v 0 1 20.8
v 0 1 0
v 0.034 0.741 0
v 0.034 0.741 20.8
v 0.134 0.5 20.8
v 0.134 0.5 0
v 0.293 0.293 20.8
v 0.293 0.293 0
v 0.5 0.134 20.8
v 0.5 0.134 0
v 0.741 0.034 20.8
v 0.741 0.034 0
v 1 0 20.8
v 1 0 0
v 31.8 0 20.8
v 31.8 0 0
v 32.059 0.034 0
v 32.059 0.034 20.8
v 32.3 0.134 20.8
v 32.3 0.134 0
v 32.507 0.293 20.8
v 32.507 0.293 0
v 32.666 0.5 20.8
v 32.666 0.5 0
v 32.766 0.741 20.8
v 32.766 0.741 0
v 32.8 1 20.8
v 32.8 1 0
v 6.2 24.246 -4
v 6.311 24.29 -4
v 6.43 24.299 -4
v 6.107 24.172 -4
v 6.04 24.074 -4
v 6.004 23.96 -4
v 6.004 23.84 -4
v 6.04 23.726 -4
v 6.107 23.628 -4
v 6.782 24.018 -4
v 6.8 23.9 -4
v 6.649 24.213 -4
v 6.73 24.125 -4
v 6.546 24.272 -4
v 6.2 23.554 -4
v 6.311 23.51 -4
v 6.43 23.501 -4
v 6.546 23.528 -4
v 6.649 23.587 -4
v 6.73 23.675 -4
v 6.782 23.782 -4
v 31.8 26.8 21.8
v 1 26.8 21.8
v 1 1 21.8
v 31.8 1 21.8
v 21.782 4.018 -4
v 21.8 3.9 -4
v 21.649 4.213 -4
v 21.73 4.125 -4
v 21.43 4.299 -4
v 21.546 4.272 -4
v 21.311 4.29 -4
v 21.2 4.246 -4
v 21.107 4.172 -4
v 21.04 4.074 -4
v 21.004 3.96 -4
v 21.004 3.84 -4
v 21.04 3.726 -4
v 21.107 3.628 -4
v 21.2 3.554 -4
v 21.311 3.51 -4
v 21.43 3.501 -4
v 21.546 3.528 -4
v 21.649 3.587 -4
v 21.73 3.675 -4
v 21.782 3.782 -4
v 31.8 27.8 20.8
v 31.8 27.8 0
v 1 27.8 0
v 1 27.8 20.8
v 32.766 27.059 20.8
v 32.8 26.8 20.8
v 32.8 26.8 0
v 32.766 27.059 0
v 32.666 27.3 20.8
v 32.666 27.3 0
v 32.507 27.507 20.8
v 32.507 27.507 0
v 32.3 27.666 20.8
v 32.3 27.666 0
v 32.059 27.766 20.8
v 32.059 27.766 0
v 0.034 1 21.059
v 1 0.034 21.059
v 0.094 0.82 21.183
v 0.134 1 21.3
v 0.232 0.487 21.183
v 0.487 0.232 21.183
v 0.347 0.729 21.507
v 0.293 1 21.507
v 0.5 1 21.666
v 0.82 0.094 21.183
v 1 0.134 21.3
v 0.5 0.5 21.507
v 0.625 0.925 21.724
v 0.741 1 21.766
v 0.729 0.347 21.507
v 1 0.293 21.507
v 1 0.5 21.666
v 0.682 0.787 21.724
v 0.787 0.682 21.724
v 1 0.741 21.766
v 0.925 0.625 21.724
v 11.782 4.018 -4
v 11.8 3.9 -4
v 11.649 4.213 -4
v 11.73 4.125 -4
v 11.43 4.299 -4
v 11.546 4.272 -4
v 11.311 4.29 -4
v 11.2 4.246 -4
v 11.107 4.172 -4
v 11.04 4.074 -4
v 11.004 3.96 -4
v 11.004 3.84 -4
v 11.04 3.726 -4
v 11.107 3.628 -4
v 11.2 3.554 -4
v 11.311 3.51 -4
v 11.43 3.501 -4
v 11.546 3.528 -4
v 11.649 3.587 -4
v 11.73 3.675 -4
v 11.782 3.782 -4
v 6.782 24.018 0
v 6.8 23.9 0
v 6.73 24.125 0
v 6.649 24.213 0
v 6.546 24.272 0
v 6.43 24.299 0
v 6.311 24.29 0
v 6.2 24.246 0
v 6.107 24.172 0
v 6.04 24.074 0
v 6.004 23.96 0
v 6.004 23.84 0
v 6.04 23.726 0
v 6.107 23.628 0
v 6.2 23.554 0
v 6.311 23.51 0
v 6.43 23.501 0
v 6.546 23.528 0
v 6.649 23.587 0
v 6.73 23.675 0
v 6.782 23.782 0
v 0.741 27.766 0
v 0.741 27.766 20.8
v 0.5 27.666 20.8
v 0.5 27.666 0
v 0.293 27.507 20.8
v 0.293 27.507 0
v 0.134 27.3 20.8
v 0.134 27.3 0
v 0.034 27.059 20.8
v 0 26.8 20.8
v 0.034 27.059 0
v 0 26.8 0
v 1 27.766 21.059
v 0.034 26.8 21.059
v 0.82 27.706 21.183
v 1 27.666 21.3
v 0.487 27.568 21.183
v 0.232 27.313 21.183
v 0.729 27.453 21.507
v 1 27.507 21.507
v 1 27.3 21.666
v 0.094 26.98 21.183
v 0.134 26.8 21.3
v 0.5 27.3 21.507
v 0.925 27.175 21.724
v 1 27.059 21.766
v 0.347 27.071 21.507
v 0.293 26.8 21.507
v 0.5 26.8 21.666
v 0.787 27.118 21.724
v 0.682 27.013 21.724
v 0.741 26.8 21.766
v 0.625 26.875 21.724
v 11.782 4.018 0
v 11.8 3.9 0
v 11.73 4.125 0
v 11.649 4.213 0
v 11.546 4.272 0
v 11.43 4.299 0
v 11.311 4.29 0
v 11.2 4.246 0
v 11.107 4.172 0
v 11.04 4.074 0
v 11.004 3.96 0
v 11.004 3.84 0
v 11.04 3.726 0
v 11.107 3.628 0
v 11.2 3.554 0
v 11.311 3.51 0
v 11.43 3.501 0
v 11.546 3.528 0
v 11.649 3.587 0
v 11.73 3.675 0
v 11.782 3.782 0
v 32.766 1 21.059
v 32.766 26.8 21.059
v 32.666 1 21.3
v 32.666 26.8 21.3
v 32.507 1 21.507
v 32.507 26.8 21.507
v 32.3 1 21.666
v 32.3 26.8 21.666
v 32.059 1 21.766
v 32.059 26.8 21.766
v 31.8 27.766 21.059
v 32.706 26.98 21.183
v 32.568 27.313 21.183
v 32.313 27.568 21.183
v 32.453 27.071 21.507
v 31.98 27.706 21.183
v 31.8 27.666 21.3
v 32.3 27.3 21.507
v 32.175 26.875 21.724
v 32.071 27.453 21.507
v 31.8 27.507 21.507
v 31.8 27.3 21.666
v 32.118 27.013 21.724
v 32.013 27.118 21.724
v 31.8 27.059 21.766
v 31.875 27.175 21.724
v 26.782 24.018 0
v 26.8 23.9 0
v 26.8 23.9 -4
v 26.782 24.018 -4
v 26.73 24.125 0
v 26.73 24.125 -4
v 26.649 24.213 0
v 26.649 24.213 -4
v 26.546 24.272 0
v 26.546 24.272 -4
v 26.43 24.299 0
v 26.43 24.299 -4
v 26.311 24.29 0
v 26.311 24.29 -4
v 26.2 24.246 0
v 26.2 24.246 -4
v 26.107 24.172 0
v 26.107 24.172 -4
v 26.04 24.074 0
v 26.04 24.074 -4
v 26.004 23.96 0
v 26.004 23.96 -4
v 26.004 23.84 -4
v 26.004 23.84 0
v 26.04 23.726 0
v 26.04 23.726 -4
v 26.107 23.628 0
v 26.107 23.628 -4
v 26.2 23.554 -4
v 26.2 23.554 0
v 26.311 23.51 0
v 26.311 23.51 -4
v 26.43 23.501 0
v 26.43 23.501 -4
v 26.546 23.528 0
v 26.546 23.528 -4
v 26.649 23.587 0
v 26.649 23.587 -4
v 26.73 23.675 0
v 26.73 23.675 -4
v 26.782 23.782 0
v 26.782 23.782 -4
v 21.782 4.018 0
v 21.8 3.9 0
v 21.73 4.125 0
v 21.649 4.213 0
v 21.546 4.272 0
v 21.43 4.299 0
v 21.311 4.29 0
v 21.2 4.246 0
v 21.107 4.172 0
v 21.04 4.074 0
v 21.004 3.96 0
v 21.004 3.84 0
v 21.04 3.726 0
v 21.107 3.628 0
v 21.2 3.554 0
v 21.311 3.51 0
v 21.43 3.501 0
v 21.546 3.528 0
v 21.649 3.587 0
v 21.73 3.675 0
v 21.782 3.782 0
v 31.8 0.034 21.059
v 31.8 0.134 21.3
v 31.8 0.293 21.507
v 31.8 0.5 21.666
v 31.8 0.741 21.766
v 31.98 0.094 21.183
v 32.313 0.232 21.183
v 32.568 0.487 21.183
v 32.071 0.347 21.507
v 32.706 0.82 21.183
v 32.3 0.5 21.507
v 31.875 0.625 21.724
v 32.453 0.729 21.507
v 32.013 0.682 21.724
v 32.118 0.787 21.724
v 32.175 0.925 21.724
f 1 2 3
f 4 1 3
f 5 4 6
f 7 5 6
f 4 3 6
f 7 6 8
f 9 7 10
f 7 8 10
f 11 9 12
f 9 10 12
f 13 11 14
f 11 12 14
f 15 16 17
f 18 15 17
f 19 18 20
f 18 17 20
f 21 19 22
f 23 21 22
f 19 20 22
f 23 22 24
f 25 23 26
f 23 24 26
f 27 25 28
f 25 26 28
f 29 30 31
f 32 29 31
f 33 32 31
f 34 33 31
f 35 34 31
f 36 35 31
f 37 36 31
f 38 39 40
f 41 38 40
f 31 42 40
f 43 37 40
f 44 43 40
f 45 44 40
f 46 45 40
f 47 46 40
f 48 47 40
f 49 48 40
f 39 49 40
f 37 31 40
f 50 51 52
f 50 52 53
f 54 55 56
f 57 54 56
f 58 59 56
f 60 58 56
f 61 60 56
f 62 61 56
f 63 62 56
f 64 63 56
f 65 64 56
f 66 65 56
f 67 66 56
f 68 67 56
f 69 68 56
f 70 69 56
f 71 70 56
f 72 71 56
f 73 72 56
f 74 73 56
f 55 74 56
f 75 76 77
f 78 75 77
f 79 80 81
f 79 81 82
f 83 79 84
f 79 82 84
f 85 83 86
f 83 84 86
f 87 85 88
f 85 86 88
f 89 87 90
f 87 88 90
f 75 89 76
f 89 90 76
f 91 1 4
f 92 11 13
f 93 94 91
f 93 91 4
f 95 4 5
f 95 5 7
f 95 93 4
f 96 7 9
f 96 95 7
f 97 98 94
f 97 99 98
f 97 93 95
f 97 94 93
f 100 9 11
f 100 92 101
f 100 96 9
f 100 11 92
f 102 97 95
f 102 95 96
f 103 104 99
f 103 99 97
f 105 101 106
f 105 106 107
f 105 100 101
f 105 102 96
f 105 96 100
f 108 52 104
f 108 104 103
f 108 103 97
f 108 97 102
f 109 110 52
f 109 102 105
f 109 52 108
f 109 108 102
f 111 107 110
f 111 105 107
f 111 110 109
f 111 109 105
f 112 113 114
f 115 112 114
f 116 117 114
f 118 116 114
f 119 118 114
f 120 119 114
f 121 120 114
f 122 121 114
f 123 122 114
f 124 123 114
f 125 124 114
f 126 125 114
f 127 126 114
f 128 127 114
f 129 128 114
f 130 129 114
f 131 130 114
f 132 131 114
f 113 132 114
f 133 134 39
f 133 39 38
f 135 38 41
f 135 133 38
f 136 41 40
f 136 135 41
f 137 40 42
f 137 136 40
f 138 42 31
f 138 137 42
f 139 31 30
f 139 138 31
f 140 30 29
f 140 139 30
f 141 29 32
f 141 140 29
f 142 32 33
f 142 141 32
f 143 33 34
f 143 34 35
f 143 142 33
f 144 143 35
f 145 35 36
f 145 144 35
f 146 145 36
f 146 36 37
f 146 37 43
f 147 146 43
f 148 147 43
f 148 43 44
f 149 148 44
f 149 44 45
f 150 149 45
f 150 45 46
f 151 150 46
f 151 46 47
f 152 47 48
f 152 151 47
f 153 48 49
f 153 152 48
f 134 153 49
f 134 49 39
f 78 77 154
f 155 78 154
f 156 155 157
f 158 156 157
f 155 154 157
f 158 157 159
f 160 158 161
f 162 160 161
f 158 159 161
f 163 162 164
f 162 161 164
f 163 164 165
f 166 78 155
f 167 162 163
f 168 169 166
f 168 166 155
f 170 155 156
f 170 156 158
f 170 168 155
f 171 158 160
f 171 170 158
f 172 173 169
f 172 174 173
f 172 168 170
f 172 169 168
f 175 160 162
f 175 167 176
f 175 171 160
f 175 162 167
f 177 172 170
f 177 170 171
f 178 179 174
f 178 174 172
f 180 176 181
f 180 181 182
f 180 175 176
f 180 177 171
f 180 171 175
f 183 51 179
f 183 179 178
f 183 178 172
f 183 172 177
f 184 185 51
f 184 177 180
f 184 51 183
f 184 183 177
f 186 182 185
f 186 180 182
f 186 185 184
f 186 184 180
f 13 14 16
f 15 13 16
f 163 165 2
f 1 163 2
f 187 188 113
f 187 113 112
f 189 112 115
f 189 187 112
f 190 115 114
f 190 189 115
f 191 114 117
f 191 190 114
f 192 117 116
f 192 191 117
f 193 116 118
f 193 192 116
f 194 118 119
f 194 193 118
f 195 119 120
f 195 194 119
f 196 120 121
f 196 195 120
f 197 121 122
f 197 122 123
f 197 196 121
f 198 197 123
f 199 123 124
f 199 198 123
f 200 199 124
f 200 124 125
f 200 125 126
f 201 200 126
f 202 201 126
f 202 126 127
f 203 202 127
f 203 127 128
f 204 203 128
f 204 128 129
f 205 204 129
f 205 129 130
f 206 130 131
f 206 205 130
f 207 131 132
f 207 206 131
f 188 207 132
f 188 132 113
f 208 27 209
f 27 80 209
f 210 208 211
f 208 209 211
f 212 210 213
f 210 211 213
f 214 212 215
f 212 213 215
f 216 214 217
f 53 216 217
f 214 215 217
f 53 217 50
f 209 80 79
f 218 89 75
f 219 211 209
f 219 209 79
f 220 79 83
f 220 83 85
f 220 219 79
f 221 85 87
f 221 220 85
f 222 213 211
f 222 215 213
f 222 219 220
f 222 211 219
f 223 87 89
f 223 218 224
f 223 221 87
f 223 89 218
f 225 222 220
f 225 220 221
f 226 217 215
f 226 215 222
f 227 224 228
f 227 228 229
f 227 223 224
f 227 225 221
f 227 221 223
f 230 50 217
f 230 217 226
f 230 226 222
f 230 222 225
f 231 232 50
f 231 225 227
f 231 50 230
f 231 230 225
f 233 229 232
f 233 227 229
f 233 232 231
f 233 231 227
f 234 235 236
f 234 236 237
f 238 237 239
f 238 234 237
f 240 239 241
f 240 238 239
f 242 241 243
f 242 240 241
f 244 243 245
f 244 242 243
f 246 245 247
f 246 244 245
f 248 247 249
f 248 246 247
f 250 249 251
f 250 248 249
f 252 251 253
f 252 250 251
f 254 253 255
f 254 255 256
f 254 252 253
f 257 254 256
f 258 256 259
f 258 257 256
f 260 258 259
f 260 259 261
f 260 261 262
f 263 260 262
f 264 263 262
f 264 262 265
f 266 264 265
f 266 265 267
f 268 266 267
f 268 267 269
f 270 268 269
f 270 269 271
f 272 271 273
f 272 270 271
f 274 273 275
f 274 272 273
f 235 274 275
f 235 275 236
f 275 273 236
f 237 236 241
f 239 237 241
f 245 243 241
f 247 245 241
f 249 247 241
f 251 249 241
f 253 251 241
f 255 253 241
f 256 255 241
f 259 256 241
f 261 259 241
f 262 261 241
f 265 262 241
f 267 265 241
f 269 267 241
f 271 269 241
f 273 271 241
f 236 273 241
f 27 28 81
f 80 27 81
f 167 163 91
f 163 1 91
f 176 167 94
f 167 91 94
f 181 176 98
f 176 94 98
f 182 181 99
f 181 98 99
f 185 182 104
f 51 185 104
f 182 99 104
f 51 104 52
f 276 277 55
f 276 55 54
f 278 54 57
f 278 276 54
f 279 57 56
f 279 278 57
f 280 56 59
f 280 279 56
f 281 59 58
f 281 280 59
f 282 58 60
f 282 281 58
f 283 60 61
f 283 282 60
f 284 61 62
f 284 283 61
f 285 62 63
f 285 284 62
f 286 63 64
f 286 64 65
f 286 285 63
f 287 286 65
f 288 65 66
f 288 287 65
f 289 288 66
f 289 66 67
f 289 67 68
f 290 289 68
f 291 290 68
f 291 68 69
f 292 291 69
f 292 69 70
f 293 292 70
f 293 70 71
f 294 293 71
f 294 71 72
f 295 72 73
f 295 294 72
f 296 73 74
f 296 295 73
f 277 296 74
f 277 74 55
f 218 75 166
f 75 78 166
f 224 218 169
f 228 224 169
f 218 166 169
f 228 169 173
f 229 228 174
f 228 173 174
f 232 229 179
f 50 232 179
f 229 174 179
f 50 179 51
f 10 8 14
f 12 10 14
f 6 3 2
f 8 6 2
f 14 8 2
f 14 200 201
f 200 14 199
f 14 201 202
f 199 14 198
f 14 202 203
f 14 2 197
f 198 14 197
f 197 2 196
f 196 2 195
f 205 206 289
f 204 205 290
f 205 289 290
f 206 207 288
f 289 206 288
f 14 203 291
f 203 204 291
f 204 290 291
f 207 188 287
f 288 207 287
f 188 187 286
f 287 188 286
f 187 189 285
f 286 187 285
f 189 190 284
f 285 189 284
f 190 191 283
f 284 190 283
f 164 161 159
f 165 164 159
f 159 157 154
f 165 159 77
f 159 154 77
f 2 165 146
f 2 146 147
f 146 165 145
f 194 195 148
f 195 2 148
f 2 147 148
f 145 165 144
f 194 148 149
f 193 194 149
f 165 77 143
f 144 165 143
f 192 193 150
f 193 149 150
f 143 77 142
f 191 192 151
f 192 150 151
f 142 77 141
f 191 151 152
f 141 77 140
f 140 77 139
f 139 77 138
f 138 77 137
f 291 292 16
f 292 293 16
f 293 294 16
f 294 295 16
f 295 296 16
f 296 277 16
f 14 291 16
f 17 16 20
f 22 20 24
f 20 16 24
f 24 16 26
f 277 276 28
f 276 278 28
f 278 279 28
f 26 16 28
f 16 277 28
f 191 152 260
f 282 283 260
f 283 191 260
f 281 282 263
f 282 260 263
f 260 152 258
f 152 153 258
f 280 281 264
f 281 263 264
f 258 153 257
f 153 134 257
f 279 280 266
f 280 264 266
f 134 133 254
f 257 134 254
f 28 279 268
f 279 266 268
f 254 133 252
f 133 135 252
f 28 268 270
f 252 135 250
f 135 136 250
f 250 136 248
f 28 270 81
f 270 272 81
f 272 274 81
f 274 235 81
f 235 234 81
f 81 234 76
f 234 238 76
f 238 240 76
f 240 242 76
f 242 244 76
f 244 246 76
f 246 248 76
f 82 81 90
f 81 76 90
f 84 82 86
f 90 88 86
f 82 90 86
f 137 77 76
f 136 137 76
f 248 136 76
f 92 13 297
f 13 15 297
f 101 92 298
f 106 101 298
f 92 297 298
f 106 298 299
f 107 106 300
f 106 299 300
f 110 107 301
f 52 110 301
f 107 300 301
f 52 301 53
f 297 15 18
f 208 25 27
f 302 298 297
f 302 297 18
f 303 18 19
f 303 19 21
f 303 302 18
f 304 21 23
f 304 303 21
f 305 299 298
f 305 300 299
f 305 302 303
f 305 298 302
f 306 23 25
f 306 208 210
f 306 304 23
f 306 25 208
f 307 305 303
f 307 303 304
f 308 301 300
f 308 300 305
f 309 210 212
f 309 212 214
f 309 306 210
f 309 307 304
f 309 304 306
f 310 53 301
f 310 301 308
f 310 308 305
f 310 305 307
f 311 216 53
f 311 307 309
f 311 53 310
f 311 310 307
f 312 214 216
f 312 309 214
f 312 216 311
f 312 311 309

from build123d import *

# Parameters (mm, degrees)
P_IDAT_VYSUNUT_M1_DEPTH = 21.8
ZAOBLIT1_R              = 1
SKICA2_R                = 0.4
P_IDAT_VYSUNUT_M2_DEPTH = 4


with BuildPart() as part:
    # Skica1 → Přidat vysunutím1 (new body)
    with BuildSketch(Plane.XY):
        with BuildLine():
            Line((1, 0), (31.8, 0))
            ThreePointArc((31.8, 0), (32.507106781, 0.292893219), (32.8, 1))
            Line((32.8, 1), (32.8, 26.8))
            ThreePointArc((32.8, 26.8), (32.507106781, 27.507106781), (31.8, 27.8))
            Line((31.8, 27.8), (1, 27.8))
            ThreePointArc((1, 27.8), (0.292893219, 27.507106781), (0, 26.8))
            Line((0, 26.8), (0, 1))
            ThreePointArc((0, 1), (0.292893219, 0.292893219), (1, 0))
        make_face()
    extrude(amount=P_IDAT_VYSUNUT_M1_DEPTH)

    # Zaoblit1
    zaoblit1_edges = [part.edges().sort_by_distance(p)[0] for p in [
        (32.507106781, 27.507106781, 21.8),
        (16.4, 27.8, 21.8),
        (0.292893219, 27.507106781, 21.8),
        (0, 13.9, 21.8),
        (0.292893219, 0.292893219, 21.8),
        (16.4, 0, 21.8),
        (32.507106781, 0.292893219, 21.8),
        (32.8, 13.9, 21.8),
    ]]
    fillet(zaoblit1_edges, radius=ZAOBLIT1_R)

    # Skica2 → Přidat vysunutím2 (add)
    with BuildSketch(Plane.XY):
        with Locations((21.4, 3.9)):
            Circle(SKICA2_R)
        with Locations((26.4, 23.9)):
            Circle(SKICA2_R)
        with Locations((6.4, 23.9)):
            Circle(SKICA2_R)
        with Locations((11.4, 3.9)):
            Circle(SKICA2_R)
    extrude(amount=-P_IDAT_VYSUNUT_M2_DEPTH)


solid = part.part
